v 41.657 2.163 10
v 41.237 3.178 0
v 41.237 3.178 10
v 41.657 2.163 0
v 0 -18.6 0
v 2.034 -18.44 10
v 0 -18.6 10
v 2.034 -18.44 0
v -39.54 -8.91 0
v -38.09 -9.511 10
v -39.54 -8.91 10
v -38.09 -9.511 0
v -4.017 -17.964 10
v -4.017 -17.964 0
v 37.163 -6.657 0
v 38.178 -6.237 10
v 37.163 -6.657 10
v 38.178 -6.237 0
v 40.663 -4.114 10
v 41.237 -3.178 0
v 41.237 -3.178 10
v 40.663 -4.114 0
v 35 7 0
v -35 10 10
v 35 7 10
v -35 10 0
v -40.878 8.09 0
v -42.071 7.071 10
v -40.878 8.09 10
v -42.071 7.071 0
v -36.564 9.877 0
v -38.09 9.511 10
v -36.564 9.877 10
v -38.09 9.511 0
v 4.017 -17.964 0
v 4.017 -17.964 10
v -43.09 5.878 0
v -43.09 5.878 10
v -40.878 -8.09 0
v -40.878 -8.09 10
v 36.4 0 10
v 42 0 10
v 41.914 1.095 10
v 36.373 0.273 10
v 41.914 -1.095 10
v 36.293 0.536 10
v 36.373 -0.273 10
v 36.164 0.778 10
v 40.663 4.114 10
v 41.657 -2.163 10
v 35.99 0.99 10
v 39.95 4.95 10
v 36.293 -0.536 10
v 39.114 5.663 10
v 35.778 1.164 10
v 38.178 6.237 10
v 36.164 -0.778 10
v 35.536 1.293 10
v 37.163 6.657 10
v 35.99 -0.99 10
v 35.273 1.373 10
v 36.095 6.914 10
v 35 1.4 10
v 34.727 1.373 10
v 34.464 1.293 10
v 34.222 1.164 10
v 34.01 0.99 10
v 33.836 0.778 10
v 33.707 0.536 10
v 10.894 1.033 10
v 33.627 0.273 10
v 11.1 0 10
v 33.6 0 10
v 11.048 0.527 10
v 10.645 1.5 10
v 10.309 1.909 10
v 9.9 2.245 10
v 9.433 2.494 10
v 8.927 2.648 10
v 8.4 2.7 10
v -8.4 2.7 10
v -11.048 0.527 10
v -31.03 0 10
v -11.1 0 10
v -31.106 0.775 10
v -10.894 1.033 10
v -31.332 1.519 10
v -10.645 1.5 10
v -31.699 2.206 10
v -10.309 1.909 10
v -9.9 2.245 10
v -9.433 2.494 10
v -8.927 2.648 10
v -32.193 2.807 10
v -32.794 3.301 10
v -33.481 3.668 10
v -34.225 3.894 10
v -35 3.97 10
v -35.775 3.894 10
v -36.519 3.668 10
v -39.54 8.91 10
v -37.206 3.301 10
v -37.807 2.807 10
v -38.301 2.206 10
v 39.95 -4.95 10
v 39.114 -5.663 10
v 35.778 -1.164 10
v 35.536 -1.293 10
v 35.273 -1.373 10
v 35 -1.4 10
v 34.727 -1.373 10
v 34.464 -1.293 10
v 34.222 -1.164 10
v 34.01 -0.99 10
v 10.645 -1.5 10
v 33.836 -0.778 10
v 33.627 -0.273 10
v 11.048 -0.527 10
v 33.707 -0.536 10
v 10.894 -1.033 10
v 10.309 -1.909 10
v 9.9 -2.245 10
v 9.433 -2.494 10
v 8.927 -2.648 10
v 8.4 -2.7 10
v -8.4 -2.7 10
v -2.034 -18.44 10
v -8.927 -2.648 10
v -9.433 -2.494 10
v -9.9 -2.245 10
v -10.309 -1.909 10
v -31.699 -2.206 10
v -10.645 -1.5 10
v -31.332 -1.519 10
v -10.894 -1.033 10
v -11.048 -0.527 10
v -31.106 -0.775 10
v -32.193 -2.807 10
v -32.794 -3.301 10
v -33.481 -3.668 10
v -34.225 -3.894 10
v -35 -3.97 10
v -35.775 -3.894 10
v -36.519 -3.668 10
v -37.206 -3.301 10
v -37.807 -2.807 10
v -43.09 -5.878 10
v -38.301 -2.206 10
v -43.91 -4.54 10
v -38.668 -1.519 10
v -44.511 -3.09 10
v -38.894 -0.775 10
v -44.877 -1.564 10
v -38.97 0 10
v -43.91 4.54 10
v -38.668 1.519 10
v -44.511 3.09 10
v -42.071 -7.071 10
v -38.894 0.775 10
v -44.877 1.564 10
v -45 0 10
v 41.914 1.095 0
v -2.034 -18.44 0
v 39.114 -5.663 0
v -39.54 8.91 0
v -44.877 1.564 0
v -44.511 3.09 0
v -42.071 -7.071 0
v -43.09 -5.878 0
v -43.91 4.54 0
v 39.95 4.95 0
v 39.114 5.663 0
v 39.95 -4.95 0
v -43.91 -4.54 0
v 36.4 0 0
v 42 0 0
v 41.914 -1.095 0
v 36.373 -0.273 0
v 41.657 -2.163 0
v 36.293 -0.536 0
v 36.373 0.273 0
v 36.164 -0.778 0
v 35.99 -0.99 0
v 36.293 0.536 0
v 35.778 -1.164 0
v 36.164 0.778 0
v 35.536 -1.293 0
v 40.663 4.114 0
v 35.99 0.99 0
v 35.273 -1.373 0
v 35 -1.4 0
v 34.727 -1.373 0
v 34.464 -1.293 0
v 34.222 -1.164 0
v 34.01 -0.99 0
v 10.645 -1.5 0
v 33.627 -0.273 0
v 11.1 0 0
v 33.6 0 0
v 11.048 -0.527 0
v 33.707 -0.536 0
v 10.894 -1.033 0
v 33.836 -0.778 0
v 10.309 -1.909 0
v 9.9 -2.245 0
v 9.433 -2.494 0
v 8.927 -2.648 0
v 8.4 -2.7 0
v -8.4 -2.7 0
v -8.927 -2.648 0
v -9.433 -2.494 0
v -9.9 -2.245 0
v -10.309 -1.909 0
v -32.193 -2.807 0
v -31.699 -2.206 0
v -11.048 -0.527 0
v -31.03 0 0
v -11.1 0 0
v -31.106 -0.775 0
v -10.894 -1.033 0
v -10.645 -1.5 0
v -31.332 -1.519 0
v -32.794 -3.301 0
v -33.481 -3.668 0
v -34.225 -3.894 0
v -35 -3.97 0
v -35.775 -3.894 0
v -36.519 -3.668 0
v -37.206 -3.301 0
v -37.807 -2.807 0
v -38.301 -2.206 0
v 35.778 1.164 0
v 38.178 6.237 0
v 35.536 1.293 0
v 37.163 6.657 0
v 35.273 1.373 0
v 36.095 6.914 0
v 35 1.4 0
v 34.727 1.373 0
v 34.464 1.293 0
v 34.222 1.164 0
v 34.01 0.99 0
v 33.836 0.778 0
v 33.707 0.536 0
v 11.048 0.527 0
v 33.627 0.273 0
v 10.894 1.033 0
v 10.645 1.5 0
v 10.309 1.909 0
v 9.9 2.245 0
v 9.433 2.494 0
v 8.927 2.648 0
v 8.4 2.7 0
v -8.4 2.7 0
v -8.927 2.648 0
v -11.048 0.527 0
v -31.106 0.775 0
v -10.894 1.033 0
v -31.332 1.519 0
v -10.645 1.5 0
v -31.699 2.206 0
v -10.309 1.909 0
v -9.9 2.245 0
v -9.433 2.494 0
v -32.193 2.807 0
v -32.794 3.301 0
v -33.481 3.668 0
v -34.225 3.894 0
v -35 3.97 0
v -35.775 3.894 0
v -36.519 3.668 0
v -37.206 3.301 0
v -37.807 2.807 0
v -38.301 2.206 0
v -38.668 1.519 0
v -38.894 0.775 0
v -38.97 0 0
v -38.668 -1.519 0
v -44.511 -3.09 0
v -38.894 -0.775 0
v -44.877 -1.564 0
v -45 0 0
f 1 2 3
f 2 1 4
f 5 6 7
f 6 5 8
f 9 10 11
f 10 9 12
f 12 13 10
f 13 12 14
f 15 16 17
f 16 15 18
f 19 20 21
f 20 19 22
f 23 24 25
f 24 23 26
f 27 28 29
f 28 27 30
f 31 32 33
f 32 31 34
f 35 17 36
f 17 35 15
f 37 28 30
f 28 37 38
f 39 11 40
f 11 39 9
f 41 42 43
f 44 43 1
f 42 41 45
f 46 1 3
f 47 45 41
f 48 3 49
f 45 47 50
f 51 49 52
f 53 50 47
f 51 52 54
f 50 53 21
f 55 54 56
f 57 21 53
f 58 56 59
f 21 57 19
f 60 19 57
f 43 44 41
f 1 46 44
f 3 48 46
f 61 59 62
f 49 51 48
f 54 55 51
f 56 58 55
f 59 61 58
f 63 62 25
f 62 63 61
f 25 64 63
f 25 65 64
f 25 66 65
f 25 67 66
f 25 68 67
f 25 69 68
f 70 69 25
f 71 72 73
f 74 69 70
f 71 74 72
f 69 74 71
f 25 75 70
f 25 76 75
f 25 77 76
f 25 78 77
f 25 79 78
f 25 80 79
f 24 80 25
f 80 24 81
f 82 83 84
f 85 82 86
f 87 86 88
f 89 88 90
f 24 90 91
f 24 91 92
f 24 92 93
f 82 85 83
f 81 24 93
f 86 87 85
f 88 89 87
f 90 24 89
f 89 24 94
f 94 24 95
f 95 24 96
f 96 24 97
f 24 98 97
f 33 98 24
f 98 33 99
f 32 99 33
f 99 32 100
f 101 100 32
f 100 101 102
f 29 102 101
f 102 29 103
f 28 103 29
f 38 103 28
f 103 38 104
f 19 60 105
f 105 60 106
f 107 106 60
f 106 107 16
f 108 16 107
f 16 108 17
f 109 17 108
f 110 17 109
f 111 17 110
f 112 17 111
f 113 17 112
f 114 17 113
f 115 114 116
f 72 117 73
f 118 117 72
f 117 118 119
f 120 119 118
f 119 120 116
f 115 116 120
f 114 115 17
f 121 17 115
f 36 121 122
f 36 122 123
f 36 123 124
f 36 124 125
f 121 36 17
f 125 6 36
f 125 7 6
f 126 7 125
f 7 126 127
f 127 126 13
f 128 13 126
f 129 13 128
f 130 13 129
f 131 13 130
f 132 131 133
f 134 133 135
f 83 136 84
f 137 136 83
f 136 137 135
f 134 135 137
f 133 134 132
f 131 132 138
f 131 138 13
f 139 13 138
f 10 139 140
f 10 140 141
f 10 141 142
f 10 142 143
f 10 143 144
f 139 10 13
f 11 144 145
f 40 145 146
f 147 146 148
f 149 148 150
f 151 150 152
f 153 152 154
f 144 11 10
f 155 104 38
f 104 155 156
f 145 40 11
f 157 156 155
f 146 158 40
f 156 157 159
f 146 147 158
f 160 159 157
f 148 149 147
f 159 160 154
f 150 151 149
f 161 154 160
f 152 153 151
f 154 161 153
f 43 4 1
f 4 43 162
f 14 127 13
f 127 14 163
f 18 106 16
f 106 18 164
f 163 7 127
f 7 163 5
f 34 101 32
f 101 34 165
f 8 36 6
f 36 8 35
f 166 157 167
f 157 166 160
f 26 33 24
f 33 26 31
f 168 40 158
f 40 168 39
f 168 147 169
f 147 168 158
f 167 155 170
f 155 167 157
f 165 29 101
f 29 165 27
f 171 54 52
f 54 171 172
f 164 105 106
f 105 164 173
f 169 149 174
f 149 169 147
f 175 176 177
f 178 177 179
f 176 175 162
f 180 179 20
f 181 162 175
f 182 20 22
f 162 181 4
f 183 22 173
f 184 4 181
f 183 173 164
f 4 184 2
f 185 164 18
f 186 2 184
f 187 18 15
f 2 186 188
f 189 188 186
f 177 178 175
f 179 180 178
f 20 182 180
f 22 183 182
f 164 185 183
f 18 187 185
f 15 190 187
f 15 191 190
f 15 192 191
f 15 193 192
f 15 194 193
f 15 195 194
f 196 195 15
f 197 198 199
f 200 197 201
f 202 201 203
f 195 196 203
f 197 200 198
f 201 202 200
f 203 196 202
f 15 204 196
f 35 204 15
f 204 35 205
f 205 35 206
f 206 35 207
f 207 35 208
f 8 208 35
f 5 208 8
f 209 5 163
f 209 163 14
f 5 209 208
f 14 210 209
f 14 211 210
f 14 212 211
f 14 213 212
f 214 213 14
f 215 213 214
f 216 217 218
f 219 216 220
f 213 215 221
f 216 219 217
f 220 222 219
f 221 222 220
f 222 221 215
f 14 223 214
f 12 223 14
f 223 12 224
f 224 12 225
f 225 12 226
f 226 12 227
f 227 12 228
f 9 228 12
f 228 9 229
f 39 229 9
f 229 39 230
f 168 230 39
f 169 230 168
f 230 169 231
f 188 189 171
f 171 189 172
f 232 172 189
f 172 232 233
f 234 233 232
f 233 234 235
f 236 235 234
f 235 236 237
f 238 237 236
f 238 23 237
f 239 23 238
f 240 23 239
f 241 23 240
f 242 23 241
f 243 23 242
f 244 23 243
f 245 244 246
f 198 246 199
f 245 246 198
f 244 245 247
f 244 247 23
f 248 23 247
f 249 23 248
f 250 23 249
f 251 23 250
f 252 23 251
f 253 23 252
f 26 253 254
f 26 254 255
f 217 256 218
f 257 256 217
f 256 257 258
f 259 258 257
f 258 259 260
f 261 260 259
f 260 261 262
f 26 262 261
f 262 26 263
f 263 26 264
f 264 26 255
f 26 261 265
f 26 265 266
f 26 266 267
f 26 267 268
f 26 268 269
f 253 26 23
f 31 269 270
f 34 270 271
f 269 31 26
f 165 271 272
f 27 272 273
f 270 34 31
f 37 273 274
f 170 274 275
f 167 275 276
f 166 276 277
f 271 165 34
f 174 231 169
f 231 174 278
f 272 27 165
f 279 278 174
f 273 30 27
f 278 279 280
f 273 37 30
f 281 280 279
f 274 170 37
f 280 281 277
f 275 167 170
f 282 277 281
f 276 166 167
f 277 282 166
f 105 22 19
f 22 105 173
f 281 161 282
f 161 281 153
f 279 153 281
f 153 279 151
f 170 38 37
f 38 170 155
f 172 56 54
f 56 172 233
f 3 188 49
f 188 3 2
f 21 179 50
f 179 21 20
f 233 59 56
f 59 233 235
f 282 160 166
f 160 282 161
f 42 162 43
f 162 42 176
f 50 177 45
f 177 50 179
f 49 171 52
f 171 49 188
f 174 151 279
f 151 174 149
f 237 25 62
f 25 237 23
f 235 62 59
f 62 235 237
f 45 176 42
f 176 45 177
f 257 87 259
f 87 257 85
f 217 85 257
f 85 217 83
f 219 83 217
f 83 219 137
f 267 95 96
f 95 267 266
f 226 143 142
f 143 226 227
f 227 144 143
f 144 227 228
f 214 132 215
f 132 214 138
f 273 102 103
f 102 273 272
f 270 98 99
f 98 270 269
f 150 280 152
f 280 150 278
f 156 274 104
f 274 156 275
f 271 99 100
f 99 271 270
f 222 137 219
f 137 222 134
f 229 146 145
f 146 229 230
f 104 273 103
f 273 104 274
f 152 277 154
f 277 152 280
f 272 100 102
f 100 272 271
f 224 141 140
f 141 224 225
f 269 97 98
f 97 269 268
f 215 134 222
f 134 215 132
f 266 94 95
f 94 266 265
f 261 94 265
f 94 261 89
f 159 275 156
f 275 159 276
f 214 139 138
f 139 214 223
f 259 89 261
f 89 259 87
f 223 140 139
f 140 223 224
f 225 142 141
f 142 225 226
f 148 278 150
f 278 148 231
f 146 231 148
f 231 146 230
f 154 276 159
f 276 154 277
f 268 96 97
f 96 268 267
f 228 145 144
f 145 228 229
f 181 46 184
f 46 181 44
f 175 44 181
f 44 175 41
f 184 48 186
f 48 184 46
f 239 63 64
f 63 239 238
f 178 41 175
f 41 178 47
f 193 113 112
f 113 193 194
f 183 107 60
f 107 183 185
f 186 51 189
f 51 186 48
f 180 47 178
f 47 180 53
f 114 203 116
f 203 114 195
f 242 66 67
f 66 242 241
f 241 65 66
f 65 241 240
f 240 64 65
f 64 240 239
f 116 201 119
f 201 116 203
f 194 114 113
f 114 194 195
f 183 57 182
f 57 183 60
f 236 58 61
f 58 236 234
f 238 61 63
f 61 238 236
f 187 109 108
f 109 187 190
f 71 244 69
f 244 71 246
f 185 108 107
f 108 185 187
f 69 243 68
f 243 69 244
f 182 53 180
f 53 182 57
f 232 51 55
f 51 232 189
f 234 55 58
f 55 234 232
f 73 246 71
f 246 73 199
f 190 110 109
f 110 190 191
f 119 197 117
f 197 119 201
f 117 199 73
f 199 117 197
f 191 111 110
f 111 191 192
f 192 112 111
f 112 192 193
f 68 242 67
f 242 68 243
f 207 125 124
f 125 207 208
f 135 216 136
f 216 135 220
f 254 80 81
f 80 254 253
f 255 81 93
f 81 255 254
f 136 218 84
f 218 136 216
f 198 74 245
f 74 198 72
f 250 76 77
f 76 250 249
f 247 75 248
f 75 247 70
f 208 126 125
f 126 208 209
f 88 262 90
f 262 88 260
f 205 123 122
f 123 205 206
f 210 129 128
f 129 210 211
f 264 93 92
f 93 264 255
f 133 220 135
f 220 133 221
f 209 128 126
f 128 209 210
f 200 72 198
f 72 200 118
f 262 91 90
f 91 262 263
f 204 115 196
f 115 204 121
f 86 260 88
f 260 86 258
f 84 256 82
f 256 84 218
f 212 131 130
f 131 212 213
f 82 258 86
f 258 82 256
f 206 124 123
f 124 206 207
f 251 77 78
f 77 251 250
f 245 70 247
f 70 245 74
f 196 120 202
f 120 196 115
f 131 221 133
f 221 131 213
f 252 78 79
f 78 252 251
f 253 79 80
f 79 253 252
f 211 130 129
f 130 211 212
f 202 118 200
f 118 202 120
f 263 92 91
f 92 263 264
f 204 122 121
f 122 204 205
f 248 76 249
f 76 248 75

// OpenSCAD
$fn = 32;

// ----------------------------------------------------------------------
// Lever: 70 mm between the bosses, 10 mm thick, smooth outline
// ----------------------------------------------------------------------

// --- parameters (mm) ---
lever_l = 70;             // distance between the boss centres
boss_a = 20;              // first boss diameter
boss_b = 14;              // second boss diameter
bore_a = 7.94;            // first bore
bore_b = 2.8;             // second bore
lever_t = 10;             // lever thickness
boss_c = 26;              // middle boss diameter
bend = 5.6;               // how far the middle boss drops
slot_w = 5.4;             // adjustment slot width

lever_profile = [[-45, 0], [-44.877, -1.564], [-44.511, -3.09], [-43.91, -4.54], [-43.09, -5.878], [-42.071, -7.071], [-40.878, -8.09], [-39.54, -8.91], [-38.09, -9.511], [-4.017, -17.964], [-2.034, -18.44], [0, -18.6], [2.034, -18.44], [4.017, -17.964], [37.163, -6.657], [38.178, -6.237], [39.114, -5.663], [39.95, -4.95], [40.663, -4.114], [41.237, -3.178], [41.657, -2.163], [41.914, -1.095], [42, 0], [41.914, 1.095], [41.657, 2.163], [41.237, 3.178], [40.663, 4.114], [39.95, 4.95], [39.114, 5.663], [38.178, 6.237], [37.163, 6.657], [36.095, 6.914], [35, 7], [-35, 10], [-36.564, 9.877], [-38.09, 9.511], [-39.54, 8.91], [-40.878, 8.09], [-42.071, 7.071], [-43.09, 5.878], [-43.91, 4.54], [-44.511, 3.09], [-44.877, 1.564]];

difference() {
  linear_extrude(height = lever_t) polygon(lever_profile);
  translate([-35, 0, -2.5]) cylinder(h = lever_t + 5, d = bore_a);
  translate([35, 0, -2.5]) cylinder(h = lever_t + 5, d = bore_b);
  /* slotted adjustment, stadium shaped */
  hull() {
    translate([-8.4, 0, -2.5]) cylinder(h = lever_t + 5, d = slot_w);
    translate([8.4, 0, -2.5]) cylinder(h = lever_t + 5, d = slot_w);
  }
}
